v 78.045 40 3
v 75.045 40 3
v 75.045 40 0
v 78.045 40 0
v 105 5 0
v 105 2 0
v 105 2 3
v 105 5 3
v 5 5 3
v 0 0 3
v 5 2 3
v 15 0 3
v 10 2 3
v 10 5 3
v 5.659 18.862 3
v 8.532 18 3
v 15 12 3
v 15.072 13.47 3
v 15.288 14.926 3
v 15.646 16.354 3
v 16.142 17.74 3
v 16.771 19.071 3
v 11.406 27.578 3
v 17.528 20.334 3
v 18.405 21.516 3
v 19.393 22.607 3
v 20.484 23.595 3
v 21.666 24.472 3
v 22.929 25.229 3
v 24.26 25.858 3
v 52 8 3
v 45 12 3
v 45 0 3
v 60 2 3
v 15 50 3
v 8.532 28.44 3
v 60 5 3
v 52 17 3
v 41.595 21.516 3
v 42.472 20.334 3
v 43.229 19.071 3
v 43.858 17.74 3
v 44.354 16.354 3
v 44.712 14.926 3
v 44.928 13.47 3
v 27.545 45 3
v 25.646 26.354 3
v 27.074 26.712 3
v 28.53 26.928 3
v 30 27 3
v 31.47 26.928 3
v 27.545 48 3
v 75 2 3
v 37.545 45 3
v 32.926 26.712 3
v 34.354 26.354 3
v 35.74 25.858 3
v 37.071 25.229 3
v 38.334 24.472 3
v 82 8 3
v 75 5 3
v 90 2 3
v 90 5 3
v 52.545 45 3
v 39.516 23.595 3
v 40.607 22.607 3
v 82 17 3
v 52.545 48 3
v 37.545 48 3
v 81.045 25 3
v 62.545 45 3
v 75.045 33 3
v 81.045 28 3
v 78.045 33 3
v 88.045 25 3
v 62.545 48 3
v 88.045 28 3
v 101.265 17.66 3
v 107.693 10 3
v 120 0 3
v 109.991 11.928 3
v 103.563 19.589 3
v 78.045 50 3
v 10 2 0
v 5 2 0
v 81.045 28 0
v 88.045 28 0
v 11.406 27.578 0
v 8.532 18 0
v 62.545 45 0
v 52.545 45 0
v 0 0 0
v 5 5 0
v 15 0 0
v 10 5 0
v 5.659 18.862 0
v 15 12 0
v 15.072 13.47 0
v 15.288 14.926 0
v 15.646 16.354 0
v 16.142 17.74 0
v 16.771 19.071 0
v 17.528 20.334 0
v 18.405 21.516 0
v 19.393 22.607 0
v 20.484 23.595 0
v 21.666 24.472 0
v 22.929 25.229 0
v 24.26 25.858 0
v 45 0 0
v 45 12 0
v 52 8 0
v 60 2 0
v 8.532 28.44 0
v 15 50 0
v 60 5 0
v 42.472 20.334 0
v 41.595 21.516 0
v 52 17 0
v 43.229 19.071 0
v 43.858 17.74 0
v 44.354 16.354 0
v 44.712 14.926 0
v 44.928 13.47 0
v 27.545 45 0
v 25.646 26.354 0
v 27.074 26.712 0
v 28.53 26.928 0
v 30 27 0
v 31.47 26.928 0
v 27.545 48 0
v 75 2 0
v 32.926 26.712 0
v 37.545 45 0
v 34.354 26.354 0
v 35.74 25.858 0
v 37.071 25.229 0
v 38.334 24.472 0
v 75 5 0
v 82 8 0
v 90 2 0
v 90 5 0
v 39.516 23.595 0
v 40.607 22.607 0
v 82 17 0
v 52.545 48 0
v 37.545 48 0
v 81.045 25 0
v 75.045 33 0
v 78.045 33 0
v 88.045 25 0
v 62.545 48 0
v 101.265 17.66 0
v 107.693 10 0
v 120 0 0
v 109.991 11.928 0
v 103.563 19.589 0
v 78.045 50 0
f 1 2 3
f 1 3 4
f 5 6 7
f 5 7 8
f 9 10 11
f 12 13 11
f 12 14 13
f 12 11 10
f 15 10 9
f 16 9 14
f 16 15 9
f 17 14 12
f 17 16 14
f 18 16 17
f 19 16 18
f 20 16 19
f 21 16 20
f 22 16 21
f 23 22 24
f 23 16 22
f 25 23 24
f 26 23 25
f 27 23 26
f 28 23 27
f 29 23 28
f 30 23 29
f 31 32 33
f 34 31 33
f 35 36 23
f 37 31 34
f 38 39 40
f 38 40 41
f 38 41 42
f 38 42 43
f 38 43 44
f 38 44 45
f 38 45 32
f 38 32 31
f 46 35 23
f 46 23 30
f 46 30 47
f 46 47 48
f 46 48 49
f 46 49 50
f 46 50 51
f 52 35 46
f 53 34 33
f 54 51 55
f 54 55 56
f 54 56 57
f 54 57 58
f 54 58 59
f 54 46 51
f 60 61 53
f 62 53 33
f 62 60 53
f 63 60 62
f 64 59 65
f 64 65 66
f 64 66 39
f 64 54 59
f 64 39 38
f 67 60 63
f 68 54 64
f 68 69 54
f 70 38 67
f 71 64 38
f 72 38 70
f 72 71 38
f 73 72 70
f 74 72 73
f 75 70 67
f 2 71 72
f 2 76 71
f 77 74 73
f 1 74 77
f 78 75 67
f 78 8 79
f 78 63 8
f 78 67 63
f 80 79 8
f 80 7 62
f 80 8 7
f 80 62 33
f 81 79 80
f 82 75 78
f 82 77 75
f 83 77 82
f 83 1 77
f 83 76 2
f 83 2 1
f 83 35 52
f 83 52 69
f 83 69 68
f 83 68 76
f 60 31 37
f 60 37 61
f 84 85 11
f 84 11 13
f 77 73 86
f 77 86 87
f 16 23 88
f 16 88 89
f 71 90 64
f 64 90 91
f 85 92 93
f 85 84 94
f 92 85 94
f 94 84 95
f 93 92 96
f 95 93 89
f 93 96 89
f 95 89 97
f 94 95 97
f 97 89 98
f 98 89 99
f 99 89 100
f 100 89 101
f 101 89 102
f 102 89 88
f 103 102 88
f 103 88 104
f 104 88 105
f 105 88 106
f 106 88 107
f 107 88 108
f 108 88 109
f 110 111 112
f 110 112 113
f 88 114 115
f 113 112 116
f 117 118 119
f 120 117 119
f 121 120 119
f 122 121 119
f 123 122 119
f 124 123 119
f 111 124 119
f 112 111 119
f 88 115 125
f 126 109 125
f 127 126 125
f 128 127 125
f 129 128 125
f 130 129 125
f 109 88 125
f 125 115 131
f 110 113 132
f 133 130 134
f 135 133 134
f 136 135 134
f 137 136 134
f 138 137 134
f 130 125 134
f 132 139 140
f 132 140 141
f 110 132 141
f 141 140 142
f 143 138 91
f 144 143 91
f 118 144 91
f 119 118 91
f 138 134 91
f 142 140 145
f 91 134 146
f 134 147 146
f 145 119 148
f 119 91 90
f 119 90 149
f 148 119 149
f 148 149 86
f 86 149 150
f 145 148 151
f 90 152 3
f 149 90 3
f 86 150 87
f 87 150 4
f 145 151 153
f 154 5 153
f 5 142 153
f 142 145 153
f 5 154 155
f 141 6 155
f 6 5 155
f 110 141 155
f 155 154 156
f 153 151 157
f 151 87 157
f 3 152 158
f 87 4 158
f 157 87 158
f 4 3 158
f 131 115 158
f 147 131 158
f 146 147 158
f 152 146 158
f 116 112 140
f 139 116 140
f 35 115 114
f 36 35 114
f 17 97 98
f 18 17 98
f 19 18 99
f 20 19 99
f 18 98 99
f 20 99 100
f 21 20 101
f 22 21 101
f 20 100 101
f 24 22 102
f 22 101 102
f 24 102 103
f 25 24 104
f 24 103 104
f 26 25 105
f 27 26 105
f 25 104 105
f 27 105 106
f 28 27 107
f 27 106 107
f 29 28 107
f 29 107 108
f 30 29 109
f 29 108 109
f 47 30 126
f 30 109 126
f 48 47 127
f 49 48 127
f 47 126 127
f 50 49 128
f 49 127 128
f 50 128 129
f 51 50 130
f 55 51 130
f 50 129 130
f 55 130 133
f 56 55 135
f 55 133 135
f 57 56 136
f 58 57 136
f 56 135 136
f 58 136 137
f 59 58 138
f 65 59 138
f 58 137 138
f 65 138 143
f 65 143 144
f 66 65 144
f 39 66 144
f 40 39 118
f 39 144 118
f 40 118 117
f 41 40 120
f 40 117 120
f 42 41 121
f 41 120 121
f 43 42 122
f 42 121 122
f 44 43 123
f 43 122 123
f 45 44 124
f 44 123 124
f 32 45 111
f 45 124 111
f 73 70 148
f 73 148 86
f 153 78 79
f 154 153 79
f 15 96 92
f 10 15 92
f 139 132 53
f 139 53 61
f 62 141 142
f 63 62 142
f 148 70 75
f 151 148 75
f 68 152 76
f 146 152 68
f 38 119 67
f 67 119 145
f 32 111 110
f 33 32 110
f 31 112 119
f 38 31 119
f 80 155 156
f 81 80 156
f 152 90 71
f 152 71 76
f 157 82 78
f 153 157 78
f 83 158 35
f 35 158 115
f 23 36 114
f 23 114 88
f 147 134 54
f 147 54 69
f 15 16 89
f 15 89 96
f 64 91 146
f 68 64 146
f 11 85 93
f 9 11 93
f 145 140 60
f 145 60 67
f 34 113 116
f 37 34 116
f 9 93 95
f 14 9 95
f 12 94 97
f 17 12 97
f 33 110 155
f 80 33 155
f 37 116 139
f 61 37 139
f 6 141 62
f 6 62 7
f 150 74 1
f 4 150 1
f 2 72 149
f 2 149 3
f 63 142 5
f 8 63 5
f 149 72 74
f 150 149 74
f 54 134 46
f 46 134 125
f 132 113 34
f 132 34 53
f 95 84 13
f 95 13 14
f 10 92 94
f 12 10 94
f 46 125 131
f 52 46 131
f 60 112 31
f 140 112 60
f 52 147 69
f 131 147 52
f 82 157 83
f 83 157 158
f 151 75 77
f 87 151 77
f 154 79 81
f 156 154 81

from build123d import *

# Parameters (mm, degrees)
CROQUIS1_W              = 15
CROQUIS1_H              = 3
CROQUIS1_W_2            = 5
CROQUIS1_W_3            = 30
CROQUIS1_H_2            = 9
SALIENTE_EXTRUIR1_DEPTH = 3
CROQUIS3_W              = 3
CROQUIS3_H              = 7
CROQUIS3_W_2            = 7
CROQUIS3_H_2            = 3
CORTAR_EXTRUIR2_DEPTH   = 4
CORTAR_EXTRUIR3_DEPTH   = 4
CORTAR_EXTRUIR4_DEPTH   = 4
CROQUIS7_W              = 10
CROQUIS7_H              = 3
CORTAR_EXTRUIR5_DEPTH   = 4


with BuildPart() as part:
    # Croquis1 → Saliente-Extruir1 (new body)
    with BuildSketch(Plane.XY):
        with BuildLine():
            Line((0, 0), (15, 0))
            Line((15, 0), (15, 12))
            ThreePointArc((15, 12), (30, 27), (45, 12))
            Line((45, 12), (45, 0))
            Line((45, 0), (120, 0))
            Line((120, 0), (78.045018441, 50))
            Line((78.045018441, 50), (15, 50))
            Line((15, 50), (0, 0))
        make_face()
        with Locations((97.5, 3.5)):
            Rectangle(CROQUIS1_W, CROQUIS1_H, mode=Mode.SUBTRACT)
        with Locations((67.5, 3.5)):
            Rectangle(CROQUIS1_W, CROQUIS1_H, mode=Mode.SUBTRACT)
        with Locations((7.5, 3.5)):
            Rectangle(CROQUIS1_W_2, CROQUIS1_H, mode=Mode.SUBTRACT)
        with Locations((67, 12.5)):
            Rectangle(CROQUIS1_W_3, CROQUIS1_H_2, mode=Mode.SUBTRACT)
    extrude(amount=SALIENTE_EXTRUIR1_DEPTH)

    # Croquis3 → Cortar-Extruir2 (cut, through all)
    with BuildSketch(Plane.XY.offset(3)):
        with Locations((76.545018441, 36.5)):
            Rectangle(CROQUIS3_W, CROQUIS3_H)
        with Locations((84.545018441, 26.5)):
            Rectangle(CROQUIS3_W_2, CROQUIS3_H_2)
    extrude(amount=-CORTAR_EXTRUIR2_DEPTH, mode=Mode.SUBTRACT)

    # Croquis5 → Cortar-Extruir3 (cut, through all)
    with BuildSketch(Plane.XY.offset(3)):
        Polygon((103.563039053, 19.58880726), (101.264905723, 17.660444431), (107.69278182, 10), (109.99091515, 11.928362829), align=None)
    extrude(amount=-CORTAR_EXTRUIR3_DEPTH, mode=Mode.SUBTRACT)

    # Croquis6 → Cortar-Extruir4 (cut, through all)
    with BuildSketch(Plane.XY.offset(3)):
        Polygon((8.532091953, 28.440306509), (11.405570808, 27.578262852), (8.532091953, 18), (5.658613097, 18.862043657), align=None)
    extrude(amount=-CORTAR_EXTRUIR4_DEPTH, mode=Mode.SUBTRACT)

    # Croquis7 → Cortar-Extruir5 (cut, through all)
    with BuildSketch(Plane(origin=(0, 0, 0), x_dir=(-1, 0, 0), z_dir=(0, 0, -1))):
        with Locations((-57.545018441, 46.5)):
            Rectangle(CROQUIS7_W, CROQUIS7_H)
        with Locations((-32.545018441, 46.5)):
            Rectangle(CROQUIS7_W, CROQUIS7_H)
    extrude(amount=-CORTAR_EXTRUIR5_DEPTH, mode=Mode.SUBTRACT)


solid = part.part
